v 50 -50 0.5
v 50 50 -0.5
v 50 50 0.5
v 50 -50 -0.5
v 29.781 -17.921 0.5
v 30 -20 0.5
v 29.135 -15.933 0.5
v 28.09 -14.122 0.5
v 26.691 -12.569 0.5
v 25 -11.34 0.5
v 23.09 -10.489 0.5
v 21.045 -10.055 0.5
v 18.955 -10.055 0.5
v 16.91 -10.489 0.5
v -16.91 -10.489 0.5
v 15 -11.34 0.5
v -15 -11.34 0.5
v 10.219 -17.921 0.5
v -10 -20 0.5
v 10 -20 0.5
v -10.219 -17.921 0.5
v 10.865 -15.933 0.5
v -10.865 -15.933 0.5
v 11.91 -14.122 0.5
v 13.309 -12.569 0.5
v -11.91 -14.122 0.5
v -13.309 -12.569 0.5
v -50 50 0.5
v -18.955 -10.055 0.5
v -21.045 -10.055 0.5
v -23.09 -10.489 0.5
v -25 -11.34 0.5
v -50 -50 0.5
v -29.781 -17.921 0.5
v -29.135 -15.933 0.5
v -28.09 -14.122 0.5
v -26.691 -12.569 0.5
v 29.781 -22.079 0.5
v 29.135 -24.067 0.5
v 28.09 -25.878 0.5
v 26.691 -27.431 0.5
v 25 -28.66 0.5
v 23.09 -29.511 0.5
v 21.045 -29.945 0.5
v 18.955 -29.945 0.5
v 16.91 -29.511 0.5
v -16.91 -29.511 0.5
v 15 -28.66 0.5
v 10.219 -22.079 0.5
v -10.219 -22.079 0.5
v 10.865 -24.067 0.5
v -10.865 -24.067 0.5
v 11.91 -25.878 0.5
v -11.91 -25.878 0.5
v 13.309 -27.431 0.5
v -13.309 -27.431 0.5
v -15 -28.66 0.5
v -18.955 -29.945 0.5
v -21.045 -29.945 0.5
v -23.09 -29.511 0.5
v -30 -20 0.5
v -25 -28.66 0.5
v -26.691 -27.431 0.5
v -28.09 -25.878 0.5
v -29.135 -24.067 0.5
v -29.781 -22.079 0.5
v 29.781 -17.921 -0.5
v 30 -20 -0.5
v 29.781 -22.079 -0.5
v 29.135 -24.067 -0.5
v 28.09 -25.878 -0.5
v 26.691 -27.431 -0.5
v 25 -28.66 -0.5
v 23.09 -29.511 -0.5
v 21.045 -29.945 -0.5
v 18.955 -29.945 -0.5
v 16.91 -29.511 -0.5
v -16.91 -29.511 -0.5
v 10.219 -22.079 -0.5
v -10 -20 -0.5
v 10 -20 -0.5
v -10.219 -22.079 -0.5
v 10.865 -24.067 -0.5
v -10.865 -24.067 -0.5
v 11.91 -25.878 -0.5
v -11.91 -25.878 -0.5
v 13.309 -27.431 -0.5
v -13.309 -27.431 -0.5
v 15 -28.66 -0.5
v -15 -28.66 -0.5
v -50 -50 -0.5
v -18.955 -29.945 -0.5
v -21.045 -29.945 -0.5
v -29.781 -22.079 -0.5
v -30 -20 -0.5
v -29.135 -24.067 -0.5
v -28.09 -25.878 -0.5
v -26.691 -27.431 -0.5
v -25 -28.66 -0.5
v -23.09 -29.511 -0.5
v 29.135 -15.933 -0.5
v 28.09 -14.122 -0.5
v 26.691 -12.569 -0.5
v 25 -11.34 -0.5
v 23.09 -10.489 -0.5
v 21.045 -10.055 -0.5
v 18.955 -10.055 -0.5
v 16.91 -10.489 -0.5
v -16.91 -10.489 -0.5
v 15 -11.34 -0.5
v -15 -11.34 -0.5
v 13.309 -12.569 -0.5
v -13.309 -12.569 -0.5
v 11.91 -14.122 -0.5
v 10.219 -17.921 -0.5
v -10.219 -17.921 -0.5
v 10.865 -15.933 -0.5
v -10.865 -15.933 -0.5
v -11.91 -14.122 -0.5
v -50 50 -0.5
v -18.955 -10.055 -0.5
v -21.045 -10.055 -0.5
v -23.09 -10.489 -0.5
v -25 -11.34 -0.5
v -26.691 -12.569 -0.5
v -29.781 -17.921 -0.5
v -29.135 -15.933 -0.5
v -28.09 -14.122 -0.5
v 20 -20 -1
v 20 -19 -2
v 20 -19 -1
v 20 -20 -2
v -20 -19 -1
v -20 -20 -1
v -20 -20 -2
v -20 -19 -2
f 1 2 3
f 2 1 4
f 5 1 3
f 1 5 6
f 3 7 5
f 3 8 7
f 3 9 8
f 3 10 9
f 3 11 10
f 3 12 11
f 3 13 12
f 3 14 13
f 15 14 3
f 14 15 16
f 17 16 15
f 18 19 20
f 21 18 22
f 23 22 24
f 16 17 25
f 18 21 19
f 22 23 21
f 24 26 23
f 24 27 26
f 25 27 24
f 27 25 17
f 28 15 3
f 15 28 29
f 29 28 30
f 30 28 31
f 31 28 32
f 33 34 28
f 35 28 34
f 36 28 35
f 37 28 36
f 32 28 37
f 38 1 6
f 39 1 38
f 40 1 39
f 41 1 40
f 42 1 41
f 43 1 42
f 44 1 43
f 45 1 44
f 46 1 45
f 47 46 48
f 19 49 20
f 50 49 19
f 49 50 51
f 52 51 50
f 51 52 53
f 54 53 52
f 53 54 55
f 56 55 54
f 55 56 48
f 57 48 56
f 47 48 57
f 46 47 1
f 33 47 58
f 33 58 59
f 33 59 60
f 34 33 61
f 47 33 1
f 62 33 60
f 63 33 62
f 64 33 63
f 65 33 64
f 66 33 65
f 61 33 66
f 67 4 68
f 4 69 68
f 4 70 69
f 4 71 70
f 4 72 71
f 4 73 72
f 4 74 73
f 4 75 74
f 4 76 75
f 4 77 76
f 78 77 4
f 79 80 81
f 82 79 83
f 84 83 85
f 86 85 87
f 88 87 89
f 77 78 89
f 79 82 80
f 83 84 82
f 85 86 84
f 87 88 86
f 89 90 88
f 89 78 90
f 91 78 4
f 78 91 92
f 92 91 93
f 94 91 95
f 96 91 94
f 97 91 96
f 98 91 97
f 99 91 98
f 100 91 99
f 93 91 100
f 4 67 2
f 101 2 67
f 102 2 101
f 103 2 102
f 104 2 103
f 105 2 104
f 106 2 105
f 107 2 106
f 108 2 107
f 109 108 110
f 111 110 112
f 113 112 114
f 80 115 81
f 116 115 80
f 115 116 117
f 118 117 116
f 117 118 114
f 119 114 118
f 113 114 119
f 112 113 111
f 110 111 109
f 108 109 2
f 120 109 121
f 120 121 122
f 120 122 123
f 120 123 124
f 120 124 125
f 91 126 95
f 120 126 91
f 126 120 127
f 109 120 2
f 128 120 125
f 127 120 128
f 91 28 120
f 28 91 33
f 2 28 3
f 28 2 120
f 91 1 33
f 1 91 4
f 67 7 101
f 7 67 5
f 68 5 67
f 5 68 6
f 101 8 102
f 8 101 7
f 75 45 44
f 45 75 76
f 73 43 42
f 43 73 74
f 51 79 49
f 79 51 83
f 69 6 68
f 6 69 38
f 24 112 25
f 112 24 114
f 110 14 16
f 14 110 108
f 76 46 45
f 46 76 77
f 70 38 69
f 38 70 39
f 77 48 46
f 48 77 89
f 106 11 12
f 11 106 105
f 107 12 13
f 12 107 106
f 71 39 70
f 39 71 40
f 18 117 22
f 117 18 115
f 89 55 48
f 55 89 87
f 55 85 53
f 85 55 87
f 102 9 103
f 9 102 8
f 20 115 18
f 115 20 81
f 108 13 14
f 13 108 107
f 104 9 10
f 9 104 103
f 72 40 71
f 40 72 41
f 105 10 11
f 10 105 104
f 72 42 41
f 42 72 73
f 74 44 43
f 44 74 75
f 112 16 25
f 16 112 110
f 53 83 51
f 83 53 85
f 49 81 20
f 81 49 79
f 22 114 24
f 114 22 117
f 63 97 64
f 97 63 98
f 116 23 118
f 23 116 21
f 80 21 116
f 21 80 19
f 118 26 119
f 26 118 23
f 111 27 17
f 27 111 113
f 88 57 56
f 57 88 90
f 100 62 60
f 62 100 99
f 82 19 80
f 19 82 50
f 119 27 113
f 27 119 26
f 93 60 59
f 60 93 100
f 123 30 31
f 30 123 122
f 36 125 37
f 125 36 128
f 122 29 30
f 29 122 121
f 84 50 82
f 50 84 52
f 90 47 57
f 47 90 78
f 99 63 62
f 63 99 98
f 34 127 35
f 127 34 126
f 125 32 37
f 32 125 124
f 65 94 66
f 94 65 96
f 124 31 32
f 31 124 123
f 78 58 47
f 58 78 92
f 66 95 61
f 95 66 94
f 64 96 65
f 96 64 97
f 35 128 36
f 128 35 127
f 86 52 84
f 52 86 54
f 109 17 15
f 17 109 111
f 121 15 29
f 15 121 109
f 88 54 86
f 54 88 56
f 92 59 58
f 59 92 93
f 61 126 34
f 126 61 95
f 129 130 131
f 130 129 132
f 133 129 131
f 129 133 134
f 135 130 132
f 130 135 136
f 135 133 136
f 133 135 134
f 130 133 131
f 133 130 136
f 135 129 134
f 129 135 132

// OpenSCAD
interasse = 40;
interasse_2 = 100;
first_hole = [20,-20,-2];


translate([first_hole[0] - interasse,-20,-2]){
#cube([40,1,1]);
}




difference(){

color("green",1.0){
cube([100,100,1], center = true);
}

translate(first_hole){
cylinder(10,10,10);
}

translate([first_hole[0] - interasse,-20,-2]){
cylinder(10,10,10);
}
}
